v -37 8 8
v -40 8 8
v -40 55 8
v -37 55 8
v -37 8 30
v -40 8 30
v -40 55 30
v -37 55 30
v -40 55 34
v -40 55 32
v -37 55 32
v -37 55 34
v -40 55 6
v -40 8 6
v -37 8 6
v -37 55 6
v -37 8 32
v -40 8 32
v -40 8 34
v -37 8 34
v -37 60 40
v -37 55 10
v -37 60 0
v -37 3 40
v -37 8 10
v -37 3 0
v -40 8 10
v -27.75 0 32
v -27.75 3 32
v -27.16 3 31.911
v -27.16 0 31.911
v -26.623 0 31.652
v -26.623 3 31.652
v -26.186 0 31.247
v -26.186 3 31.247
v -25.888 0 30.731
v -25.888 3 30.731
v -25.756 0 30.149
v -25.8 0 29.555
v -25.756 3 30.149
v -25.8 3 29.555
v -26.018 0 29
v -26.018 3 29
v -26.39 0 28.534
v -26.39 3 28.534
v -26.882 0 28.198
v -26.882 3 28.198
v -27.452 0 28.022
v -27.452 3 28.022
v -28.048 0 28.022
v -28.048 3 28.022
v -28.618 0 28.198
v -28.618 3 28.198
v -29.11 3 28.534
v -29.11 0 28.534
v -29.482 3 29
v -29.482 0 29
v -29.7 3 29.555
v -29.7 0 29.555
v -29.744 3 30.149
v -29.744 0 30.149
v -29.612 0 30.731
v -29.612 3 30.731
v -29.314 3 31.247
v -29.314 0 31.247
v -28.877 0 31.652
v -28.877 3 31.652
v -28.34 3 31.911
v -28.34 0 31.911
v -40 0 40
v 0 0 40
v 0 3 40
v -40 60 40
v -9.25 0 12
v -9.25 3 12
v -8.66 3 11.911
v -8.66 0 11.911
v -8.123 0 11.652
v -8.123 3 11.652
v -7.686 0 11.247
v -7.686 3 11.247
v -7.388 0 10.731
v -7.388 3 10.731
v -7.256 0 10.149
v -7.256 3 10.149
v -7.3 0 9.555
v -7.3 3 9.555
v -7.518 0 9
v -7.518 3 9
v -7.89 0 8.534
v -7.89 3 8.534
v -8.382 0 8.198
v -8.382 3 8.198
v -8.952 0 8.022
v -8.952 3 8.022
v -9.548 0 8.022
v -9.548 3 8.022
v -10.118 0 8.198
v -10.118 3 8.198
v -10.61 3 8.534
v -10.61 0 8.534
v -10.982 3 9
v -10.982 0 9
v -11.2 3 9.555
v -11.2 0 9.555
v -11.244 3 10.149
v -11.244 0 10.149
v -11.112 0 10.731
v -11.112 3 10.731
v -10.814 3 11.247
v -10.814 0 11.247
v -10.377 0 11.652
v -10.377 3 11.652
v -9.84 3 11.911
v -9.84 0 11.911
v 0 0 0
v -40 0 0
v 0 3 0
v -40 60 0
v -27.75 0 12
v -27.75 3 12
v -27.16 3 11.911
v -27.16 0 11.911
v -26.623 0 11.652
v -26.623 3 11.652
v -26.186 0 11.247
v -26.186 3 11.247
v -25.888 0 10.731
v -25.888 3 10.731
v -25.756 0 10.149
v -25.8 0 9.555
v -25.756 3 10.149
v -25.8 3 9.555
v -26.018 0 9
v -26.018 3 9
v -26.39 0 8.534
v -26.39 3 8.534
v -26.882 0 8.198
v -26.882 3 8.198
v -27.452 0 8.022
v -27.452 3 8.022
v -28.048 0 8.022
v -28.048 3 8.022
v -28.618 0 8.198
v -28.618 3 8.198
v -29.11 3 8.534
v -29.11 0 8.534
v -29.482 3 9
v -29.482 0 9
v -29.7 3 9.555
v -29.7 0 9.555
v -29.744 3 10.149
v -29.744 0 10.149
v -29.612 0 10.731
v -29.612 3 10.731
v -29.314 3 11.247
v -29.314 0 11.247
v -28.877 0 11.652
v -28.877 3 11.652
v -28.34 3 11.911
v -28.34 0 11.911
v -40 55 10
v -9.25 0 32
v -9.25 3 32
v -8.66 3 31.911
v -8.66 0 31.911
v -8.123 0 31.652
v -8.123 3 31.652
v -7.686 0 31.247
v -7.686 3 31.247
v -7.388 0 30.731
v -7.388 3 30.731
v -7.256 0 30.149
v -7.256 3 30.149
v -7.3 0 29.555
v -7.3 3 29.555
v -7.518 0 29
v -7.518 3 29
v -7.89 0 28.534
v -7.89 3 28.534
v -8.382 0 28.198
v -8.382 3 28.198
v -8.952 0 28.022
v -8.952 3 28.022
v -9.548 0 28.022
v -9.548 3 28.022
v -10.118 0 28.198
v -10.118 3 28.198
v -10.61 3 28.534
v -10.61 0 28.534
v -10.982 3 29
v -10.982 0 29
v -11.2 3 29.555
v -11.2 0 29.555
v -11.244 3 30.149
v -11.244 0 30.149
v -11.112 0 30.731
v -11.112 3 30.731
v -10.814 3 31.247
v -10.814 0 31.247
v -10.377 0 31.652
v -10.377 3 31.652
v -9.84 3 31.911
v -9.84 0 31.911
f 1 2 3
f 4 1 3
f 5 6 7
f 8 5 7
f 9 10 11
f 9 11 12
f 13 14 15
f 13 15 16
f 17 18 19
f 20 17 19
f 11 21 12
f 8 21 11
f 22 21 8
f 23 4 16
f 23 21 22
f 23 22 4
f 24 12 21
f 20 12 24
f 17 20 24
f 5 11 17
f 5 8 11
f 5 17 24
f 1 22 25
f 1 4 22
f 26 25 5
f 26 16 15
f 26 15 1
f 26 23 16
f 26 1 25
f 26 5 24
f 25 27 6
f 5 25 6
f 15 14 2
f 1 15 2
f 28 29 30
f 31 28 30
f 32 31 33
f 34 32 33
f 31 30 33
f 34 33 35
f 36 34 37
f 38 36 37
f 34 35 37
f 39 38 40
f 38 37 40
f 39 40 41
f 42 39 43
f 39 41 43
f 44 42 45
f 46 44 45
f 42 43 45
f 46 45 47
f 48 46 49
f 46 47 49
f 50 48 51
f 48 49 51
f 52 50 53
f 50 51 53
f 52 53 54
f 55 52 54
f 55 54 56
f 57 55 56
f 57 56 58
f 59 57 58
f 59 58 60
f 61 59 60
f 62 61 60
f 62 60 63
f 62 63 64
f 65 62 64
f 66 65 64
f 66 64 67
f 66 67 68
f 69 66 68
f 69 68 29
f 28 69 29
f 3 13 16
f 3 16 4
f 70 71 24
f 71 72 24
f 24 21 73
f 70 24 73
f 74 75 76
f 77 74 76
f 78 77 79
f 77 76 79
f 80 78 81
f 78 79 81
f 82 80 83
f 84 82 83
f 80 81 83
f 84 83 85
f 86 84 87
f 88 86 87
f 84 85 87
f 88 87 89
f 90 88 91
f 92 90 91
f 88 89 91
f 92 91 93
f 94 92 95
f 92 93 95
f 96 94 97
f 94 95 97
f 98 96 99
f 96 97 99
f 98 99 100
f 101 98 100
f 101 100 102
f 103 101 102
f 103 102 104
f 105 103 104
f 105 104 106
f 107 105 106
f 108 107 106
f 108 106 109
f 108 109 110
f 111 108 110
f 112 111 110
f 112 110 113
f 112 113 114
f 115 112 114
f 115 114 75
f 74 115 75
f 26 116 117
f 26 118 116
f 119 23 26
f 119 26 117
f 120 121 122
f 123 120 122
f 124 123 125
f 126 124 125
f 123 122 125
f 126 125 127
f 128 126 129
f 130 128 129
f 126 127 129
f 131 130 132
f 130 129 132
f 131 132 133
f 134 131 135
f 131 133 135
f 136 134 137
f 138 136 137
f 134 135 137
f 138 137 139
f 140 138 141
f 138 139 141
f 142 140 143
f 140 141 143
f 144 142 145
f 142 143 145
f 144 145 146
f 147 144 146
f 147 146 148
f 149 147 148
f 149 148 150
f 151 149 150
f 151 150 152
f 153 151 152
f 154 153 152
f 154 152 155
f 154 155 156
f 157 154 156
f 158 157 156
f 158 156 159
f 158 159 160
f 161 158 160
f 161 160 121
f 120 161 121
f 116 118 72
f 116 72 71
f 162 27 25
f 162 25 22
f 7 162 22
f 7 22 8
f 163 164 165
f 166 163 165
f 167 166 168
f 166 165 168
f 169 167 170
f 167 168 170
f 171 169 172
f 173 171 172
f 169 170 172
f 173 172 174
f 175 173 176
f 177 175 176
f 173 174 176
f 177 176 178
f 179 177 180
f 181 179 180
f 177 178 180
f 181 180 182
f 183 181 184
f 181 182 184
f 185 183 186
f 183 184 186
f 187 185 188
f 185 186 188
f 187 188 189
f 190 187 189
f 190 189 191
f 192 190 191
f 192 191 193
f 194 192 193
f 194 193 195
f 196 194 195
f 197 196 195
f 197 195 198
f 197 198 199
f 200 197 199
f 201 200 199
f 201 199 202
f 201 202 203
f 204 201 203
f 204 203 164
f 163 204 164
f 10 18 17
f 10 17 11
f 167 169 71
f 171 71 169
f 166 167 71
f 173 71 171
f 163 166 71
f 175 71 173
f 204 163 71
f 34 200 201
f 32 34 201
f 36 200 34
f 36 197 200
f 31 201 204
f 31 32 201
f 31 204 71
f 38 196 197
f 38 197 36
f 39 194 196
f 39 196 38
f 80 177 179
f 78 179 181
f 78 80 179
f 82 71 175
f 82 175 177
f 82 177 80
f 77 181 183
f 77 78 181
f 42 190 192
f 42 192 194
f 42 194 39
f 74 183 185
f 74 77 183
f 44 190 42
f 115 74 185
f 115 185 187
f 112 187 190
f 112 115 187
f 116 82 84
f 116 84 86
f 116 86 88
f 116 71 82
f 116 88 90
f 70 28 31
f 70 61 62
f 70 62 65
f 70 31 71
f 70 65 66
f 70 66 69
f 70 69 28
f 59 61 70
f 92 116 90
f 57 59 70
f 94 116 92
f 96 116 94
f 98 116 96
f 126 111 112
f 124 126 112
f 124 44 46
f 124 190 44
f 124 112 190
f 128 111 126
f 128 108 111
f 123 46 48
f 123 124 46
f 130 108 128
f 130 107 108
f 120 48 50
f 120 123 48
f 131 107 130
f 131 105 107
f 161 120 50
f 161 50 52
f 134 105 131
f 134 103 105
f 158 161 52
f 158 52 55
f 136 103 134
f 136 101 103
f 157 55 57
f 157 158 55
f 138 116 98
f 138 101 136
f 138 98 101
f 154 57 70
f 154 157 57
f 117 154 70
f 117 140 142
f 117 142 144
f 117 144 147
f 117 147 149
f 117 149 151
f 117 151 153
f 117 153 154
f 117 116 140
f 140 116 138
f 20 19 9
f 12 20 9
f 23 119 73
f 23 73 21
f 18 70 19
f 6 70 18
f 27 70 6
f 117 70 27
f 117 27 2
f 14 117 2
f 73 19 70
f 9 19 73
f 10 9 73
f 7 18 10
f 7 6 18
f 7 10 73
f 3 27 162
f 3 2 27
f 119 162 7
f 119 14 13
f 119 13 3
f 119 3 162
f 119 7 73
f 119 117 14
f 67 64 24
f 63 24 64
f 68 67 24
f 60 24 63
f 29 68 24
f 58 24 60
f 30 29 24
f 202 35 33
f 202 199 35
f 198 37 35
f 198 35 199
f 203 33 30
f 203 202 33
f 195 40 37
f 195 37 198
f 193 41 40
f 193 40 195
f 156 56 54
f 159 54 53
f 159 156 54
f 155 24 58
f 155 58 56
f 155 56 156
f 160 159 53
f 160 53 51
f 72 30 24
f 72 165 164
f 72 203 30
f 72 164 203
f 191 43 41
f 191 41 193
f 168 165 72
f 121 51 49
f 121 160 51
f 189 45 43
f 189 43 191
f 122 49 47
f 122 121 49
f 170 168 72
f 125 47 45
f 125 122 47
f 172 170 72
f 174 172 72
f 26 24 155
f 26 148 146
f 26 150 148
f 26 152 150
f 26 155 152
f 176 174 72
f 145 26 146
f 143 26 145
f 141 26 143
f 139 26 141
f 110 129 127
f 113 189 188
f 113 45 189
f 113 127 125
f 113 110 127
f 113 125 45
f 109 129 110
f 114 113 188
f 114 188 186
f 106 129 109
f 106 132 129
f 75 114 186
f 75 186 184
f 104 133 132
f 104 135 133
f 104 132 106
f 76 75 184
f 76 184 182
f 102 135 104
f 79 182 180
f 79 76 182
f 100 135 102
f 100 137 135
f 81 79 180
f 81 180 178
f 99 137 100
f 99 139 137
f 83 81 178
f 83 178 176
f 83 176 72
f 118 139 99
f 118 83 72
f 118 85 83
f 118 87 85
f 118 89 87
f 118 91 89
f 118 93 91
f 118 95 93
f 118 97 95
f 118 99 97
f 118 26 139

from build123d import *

# Parameters (mm, degrees)
BOSS_EXTRUDE1_DEPTH = 40
SKETCH2_R           = 2
CUT_EXTRUDE1_DEPTH  = 40
SKETCH3_W           = 2
SKETCH3_H           = 47
SKETCH3_W_2         = 20
CUT_EXTRUDE2_DEPTH  = 83.462112512


with BuildPart() as part:
    # Sketch1 → Boss-Extrude1 (new body)
    with BuildSketch(Plane.XY):
        Polygon((0, 0), (-40, 0), (-40, 60), (-37, 60), (-37, 3), (0, 3), align=None)
    extrude(amount=BOSS_EXTRUDE1_DEPTH)

    # Sketch2 → Cut-Extrude1 (cut)
    with BuildSketch(Plane(origin=(0, 3, 0), x_dir=(1, 0, 0), z_dir=(0, 1, 0))):
        with Locations(Location((-9.25, -30, 0), (0, 0, 270))):
            Circle(SKETCH2_R)
        with Locations(Location((-27.75, -30, 0), (0, 0, 270))):
            Circle(SKETCH2_R)
        with Locations(Location((-27.75, -10, 0), (0, 0, 270))):
            Circle(SKETCH2_R)
        with Locations(Location((-9.25, -10, 0), (0, 0, 270))):
            Circle(SKETCH2_R)
    extrude(amount=-CUT_EXTRUDE1_DEPTH, mode=Mode.SUBTRACT)

    # Sketch3 → Cut-Extrude2 (cut, through all)
    with BuildSketch(Plane.ZY.offset(40)):
        with Locations((33, 31.5)):
            Rectangle(SKETCH3_W, SKETCH3_H)
        with Locations((7, 31.5)):
            Rectangle(SKETCH3_W, SKETCH3_H)
        with Locations((20, 31.5)):
            Rectangle(SKETCH3_W_2, SKETCH3_H)
    extrude(amount=-CUT_EXTRUDE2_DEPTH, mode=Mode.SUBTRACT)


solid = part.part
